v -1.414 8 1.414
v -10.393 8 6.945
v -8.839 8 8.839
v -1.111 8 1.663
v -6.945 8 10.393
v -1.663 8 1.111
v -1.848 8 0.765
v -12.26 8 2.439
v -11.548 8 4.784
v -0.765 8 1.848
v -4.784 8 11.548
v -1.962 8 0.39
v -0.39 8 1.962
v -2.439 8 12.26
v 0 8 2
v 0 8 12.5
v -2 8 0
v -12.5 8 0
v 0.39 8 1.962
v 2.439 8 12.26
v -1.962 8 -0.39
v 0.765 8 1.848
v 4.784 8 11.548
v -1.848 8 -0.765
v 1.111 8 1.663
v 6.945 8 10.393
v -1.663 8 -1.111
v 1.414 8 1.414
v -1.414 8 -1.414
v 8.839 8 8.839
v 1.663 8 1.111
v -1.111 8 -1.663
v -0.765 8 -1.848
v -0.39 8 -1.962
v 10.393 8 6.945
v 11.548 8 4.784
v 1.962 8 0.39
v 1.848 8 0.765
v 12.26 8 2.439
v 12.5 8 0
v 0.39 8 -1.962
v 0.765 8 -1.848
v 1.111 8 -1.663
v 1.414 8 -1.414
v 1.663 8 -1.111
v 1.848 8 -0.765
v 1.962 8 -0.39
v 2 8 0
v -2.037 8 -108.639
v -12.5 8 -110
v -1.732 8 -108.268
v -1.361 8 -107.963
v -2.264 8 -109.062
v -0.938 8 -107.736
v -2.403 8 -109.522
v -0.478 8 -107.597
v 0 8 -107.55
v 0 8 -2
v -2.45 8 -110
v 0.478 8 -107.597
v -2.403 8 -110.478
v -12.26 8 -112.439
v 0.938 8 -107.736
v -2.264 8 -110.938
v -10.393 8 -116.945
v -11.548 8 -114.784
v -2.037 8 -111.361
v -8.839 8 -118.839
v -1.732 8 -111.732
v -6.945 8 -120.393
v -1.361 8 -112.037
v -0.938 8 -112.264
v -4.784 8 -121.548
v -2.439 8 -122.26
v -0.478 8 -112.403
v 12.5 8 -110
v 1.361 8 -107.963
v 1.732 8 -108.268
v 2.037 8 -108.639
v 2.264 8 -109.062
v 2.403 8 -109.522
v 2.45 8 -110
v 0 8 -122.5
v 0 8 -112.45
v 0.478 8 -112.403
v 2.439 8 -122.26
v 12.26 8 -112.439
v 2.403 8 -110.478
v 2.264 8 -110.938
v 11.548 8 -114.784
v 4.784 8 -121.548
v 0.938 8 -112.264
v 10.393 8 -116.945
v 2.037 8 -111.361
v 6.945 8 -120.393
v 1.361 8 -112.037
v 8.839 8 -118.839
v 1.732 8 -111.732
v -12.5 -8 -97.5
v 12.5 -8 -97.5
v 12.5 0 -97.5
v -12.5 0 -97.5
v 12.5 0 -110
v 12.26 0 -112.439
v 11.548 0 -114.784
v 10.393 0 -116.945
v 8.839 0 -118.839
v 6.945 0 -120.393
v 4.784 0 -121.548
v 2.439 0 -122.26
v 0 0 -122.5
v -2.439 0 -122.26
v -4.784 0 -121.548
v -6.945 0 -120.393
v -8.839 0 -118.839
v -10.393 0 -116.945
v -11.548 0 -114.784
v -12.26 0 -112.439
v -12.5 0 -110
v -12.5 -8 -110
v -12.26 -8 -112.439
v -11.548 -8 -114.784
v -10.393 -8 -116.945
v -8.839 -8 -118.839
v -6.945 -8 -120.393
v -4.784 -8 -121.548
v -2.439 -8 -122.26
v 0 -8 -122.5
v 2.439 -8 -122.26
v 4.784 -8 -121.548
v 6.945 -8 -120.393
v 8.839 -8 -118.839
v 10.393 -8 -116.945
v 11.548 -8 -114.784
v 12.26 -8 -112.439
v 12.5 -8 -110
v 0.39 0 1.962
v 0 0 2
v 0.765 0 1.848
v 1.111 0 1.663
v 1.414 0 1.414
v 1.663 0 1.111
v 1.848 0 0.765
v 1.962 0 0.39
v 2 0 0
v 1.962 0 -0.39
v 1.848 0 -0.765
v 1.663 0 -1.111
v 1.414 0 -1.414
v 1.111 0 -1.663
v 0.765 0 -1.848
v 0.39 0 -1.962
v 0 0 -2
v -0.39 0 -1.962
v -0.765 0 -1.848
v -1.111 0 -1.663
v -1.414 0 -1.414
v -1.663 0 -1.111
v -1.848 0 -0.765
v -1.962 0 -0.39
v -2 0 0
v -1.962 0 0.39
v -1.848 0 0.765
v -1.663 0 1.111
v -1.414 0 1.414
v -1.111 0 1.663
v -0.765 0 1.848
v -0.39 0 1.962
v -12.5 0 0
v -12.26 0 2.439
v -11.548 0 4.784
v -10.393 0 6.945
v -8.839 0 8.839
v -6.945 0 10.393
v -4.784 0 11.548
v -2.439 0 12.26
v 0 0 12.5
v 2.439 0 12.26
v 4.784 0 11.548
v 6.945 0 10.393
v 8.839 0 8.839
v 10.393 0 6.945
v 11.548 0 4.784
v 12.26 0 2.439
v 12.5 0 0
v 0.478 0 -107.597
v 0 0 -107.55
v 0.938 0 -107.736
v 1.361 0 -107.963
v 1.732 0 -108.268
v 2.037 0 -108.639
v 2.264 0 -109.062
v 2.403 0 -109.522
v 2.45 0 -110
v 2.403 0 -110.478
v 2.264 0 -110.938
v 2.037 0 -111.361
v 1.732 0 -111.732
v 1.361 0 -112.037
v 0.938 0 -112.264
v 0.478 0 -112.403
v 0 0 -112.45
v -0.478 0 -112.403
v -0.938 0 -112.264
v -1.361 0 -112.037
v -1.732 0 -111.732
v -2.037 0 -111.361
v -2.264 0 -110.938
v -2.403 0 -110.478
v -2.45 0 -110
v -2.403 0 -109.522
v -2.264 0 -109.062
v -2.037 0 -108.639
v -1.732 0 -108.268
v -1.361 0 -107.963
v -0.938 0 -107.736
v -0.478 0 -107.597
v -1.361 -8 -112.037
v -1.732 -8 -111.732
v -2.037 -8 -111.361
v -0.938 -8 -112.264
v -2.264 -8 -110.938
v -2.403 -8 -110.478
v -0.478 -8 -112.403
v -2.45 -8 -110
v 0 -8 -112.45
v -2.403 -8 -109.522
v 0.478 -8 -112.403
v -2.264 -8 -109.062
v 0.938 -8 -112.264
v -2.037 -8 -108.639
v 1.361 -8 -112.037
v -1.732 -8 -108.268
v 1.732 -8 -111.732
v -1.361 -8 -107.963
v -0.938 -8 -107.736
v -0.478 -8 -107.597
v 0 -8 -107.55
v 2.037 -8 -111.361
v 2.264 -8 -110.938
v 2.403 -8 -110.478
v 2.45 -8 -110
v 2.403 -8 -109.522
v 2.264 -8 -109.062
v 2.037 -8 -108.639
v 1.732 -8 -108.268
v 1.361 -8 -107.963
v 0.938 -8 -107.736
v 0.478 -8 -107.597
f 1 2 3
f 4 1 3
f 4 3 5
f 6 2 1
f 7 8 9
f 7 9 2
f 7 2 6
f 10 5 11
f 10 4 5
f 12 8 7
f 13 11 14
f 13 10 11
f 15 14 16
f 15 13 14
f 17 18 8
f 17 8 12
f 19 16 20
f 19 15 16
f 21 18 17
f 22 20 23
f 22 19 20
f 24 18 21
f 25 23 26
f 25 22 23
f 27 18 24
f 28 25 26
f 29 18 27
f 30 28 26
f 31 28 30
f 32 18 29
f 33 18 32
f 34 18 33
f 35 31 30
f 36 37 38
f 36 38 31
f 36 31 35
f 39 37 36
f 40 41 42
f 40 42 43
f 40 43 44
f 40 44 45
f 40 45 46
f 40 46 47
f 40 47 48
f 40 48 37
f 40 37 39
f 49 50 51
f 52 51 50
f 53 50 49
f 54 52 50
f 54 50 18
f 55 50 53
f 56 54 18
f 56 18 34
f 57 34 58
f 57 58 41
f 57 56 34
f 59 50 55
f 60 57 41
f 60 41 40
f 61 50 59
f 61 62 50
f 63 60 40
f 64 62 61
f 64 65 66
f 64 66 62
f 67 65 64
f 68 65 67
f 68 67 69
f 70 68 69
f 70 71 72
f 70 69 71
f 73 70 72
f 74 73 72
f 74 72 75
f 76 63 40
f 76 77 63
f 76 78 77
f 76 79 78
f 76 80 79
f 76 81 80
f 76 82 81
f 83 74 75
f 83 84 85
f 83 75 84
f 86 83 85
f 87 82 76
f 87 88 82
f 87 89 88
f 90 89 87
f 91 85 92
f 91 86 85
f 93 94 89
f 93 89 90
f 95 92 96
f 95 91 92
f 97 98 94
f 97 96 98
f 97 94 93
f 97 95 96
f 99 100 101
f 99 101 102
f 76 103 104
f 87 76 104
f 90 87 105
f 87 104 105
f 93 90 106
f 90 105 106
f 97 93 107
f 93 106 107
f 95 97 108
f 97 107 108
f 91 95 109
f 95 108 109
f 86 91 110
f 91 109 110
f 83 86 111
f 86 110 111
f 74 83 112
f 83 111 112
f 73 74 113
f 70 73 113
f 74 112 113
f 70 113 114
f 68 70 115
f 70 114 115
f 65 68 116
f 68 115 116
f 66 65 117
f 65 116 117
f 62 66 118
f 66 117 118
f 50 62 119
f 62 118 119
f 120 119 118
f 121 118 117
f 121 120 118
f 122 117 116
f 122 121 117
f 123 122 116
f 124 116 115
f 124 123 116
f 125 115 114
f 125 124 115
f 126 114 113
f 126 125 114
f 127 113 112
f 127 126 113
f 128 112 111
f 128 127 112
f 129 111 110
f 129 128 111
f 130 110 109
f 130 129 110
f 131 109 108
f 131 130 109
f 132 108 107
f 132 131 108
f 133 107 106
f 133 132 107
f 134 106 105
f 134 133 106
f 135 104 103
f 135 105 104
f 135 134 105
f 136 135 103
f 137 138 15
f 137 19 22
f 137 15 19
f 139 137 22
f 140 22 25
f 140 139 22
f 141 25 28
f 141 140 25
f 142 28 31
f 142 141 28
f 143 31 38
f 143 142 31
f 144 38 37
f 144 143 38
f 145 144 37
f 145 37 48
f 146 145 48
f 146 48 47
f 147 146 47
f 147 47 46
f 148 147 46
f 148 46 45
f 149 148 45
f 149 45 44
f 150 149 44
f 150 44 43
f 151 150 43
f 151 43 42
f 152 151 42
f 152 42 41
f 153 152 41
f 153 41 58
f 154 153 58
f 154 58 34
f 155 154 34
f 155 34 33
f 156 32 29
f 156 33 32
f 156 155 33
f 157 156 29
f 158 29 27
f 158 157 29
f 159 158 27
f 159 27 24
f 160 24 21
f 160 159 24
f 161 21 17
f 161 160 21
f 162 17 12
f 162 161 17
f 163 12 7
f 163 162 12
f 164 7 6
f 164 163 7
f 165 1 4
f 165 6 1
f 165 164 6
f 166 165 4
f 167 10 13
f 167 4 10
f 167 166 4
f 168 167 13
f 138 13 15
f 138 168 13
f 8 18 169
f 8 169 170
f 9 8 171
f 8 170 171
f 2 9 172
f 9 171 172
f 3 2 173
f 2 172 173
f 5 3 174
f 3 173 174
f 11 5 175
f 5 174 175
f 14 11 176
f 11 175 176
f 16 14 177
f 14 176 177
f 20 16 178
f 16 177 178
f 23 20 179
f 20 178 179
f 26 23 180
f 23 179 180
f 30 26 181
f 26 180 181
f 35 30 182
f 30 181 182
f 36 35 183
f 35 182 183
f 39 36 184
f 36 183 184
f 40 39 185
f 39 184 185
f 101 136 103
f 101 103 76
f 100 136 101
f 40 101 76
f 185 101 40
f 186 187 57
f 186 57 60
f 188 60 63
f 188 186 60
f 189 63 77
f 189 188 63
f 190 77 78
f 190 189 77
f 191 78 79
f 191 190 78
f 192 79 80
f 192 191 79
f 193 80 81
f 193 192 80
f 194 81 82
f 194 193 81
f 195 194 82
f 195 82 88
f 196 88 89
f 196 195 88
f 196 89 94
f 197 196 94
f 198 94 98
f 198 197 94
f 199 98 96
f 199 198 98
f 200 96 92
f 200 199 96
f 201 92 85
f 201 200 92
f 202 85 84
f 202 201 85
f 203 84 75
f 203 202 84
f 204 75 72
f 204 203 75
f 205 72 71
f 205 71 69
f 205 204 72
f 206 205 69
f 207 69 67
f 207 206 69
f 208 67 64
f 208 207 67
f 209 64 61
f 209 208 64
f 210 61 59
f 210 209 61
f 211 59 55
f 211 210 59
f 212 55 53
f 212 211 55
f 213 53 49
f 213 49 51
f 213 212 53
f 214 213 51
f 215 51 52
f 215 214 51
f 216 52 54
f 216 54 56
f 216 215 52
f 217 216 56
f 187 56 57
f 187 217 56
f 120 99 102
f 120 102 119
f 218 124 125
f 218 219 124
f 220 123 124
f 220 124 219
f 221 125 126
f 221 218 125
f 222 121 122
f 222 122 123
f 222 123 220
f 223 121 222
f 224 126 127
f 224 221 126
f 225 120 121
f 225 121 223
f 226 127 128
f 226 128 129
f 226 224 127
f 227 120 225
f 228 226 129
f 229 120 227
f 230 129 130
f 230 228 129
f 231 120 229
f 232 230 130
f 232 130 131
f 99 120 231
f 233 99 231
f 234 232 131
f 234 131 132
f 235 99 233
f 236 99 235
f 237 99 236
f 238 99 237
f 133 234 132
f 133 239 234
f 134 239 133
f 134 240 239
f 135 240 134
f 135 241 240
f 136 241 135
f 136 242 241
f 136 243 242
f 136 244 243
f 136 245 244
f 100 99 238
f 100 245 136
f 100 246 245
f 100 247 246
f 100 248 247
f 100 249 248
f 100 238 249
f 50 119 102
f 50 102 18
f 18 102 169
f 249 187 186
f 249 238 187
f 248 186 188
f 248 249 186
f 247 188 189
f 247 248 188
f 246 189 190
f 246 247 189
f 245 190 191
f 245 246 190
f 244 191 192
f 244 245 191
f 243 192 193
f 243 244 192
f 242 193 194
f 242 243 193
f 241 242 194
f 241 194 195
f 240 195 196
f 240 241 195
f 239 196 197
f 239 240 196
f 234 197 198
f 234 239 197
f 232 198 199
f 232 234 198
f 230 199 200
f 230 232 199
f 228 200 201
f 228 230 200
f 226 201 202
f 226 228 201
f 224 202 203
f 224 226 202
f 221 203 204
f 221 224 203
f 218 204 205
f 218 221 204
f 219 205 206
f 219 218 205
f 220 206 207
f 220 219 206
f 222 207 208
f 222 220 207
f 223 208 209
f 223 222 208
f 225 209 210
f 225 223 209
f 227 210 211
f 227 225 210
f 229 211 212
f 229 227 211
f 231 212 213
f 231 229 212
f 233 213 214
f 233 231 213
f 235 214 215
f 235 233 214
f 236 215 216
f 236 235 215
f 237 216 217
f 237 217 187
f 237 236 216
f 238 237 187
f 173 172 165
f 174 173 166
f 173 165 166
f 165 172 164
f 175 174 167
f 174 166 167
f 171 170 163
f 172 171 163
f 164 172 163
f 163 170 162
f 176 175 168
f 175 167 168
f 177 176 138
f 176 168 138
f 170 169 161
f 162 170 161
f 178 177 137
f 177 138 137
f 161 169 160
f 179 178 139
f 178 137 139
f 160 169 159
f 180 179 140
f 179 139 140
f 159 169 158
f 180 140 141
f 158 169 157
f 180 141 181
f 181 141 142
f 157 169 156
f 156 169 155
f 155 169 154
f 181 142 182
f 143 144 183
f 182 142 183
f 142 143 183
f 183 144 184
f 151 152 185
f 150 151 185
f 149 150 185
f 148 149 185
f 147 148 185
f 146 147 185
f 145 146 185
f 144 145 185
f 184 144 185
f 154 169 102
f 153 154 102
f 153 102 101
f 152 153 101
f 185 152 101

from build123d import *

# Parameters (mm, degrees)
SKETCH1_R               = 12.5
SKETCH1_R_2             = 2.45
BOSS_EXTRUDE1_DEPTH     = 8
CUT_EXTRUDE1_DEPTH      = 124.39570495
CUT_EXTRUDE1_DEPTH_BACK = 124.39570495
SKETCH2_R               = 2
BOSS_EXTRUDE2_START     = 8
BOSS_EXTRUDE2_DEPTH     = 8
CUT_EXTRUDE2_DEPTH      = 125.171252712
CUT_EXTRUDE2_DEPTH_BACK = 125.171252712
SKETCH4_R               = 2.45


with BuildPart() as part:
    # Sketch1 → Boss-Extrude1 (new body)
    # profile 1 of 3: a face of its own
    with BuildSketch(Plane(origin=(0, 0, 0), x_dir=(1, 0, 0), z_dir=(0, 1, 0))):
        with BuildLine():
            Line((12.5, 0), (12.5, 110))
            ThreePointArc((12.5, 110), (0, 97.5), (-12.5, 110))
            Line((-12.5, 110), (-12.5, 0))
            ThreePointArc((-12.5, 0), (0, 12.5), (12.5, 0))
        make_face()
    # profile 2 of 3: a face of its own
    with BuildSketch(Plane(origin=(0, 0, 0), x_dir=(1, 0, 0), z_dir=(0, 1, 0))):
        with Locations((0, 110)):
            Circle(SKETCH1_R)
        with Locations(Location((0, 110, 0), (0, 0, 270))):
            Circle(SKETCH1_R_2, mode=Mode.SUBTRACT)
    # profile 3 of 3: a face of its own
    with BuildSketch(Plane(origin=(0, 0, 0), x_dir=(1, 0, 0), z_dir=(0, 1, 0))):
        Circle(SKETCH1_R)
    extrude(amount=BOSS_EXTRUDE1_DEPTH)

    # Sketch2 → Cut-Extrude1 (cut, two sides: drawn at the far end of the back side and taken through both)
    with BuildSketch(Plane(origin=(0, 8, 0), x_dir=(1, 0, 0), z_dir=(0, 1, 0)).offset(-CUT_EXTRUDE1_DEPTH_BACK)):
        with Locations(Location((0, 0, 0), (0, 0, 270))):
            Circle(SKETCH2_R)
    extrude(amount=CUT_EXTRUDE1_DEPTH + CUT_EXTRUDE1_DEPTH_BACK, mode=Mode.SUBTRACT)

    # Sketch3 → Boss-Extrude2 (add)
    with BuildSketch(Plane.XZ.offset(BOSS_EXTRUDE2_START)):
        with BuildLine():
            Line((12.5, -110), (12.5, -97.5))
            Line((12.5, -97.5), (-12.5, -97.5))
            Line((-12.5, -97.5), (-12.5, -110))
            ThreePointArc((-12.5, -110), (0, -122.5), (12.5, -110))
        make_face()
    extrude(amount=-BOSS_EXTRUDE2_DEPTH)

    # Sketch4 → Cut-Extrude2 (cut, two sides: drawn at the far end of the back side and taken through both)
    with BuildSketch(Plane(origin=(0, 8, 0), x_dir=(1, 0, 0), z_dir=(0, 1, 0)).offset(-CUT_EXTRUDE2_DEPTH_BACK)):
        with Locations(Location((0, 110, 0), (0, 0, 270))):
            Circle(SKETCH4_R)
    extrude(amount=CUT_EXTRUDE2_DEPTH + CUT_EXTRUDE2_DEPTH_BACK, mode=Mode.SUBTRACT)


solid = part.part
